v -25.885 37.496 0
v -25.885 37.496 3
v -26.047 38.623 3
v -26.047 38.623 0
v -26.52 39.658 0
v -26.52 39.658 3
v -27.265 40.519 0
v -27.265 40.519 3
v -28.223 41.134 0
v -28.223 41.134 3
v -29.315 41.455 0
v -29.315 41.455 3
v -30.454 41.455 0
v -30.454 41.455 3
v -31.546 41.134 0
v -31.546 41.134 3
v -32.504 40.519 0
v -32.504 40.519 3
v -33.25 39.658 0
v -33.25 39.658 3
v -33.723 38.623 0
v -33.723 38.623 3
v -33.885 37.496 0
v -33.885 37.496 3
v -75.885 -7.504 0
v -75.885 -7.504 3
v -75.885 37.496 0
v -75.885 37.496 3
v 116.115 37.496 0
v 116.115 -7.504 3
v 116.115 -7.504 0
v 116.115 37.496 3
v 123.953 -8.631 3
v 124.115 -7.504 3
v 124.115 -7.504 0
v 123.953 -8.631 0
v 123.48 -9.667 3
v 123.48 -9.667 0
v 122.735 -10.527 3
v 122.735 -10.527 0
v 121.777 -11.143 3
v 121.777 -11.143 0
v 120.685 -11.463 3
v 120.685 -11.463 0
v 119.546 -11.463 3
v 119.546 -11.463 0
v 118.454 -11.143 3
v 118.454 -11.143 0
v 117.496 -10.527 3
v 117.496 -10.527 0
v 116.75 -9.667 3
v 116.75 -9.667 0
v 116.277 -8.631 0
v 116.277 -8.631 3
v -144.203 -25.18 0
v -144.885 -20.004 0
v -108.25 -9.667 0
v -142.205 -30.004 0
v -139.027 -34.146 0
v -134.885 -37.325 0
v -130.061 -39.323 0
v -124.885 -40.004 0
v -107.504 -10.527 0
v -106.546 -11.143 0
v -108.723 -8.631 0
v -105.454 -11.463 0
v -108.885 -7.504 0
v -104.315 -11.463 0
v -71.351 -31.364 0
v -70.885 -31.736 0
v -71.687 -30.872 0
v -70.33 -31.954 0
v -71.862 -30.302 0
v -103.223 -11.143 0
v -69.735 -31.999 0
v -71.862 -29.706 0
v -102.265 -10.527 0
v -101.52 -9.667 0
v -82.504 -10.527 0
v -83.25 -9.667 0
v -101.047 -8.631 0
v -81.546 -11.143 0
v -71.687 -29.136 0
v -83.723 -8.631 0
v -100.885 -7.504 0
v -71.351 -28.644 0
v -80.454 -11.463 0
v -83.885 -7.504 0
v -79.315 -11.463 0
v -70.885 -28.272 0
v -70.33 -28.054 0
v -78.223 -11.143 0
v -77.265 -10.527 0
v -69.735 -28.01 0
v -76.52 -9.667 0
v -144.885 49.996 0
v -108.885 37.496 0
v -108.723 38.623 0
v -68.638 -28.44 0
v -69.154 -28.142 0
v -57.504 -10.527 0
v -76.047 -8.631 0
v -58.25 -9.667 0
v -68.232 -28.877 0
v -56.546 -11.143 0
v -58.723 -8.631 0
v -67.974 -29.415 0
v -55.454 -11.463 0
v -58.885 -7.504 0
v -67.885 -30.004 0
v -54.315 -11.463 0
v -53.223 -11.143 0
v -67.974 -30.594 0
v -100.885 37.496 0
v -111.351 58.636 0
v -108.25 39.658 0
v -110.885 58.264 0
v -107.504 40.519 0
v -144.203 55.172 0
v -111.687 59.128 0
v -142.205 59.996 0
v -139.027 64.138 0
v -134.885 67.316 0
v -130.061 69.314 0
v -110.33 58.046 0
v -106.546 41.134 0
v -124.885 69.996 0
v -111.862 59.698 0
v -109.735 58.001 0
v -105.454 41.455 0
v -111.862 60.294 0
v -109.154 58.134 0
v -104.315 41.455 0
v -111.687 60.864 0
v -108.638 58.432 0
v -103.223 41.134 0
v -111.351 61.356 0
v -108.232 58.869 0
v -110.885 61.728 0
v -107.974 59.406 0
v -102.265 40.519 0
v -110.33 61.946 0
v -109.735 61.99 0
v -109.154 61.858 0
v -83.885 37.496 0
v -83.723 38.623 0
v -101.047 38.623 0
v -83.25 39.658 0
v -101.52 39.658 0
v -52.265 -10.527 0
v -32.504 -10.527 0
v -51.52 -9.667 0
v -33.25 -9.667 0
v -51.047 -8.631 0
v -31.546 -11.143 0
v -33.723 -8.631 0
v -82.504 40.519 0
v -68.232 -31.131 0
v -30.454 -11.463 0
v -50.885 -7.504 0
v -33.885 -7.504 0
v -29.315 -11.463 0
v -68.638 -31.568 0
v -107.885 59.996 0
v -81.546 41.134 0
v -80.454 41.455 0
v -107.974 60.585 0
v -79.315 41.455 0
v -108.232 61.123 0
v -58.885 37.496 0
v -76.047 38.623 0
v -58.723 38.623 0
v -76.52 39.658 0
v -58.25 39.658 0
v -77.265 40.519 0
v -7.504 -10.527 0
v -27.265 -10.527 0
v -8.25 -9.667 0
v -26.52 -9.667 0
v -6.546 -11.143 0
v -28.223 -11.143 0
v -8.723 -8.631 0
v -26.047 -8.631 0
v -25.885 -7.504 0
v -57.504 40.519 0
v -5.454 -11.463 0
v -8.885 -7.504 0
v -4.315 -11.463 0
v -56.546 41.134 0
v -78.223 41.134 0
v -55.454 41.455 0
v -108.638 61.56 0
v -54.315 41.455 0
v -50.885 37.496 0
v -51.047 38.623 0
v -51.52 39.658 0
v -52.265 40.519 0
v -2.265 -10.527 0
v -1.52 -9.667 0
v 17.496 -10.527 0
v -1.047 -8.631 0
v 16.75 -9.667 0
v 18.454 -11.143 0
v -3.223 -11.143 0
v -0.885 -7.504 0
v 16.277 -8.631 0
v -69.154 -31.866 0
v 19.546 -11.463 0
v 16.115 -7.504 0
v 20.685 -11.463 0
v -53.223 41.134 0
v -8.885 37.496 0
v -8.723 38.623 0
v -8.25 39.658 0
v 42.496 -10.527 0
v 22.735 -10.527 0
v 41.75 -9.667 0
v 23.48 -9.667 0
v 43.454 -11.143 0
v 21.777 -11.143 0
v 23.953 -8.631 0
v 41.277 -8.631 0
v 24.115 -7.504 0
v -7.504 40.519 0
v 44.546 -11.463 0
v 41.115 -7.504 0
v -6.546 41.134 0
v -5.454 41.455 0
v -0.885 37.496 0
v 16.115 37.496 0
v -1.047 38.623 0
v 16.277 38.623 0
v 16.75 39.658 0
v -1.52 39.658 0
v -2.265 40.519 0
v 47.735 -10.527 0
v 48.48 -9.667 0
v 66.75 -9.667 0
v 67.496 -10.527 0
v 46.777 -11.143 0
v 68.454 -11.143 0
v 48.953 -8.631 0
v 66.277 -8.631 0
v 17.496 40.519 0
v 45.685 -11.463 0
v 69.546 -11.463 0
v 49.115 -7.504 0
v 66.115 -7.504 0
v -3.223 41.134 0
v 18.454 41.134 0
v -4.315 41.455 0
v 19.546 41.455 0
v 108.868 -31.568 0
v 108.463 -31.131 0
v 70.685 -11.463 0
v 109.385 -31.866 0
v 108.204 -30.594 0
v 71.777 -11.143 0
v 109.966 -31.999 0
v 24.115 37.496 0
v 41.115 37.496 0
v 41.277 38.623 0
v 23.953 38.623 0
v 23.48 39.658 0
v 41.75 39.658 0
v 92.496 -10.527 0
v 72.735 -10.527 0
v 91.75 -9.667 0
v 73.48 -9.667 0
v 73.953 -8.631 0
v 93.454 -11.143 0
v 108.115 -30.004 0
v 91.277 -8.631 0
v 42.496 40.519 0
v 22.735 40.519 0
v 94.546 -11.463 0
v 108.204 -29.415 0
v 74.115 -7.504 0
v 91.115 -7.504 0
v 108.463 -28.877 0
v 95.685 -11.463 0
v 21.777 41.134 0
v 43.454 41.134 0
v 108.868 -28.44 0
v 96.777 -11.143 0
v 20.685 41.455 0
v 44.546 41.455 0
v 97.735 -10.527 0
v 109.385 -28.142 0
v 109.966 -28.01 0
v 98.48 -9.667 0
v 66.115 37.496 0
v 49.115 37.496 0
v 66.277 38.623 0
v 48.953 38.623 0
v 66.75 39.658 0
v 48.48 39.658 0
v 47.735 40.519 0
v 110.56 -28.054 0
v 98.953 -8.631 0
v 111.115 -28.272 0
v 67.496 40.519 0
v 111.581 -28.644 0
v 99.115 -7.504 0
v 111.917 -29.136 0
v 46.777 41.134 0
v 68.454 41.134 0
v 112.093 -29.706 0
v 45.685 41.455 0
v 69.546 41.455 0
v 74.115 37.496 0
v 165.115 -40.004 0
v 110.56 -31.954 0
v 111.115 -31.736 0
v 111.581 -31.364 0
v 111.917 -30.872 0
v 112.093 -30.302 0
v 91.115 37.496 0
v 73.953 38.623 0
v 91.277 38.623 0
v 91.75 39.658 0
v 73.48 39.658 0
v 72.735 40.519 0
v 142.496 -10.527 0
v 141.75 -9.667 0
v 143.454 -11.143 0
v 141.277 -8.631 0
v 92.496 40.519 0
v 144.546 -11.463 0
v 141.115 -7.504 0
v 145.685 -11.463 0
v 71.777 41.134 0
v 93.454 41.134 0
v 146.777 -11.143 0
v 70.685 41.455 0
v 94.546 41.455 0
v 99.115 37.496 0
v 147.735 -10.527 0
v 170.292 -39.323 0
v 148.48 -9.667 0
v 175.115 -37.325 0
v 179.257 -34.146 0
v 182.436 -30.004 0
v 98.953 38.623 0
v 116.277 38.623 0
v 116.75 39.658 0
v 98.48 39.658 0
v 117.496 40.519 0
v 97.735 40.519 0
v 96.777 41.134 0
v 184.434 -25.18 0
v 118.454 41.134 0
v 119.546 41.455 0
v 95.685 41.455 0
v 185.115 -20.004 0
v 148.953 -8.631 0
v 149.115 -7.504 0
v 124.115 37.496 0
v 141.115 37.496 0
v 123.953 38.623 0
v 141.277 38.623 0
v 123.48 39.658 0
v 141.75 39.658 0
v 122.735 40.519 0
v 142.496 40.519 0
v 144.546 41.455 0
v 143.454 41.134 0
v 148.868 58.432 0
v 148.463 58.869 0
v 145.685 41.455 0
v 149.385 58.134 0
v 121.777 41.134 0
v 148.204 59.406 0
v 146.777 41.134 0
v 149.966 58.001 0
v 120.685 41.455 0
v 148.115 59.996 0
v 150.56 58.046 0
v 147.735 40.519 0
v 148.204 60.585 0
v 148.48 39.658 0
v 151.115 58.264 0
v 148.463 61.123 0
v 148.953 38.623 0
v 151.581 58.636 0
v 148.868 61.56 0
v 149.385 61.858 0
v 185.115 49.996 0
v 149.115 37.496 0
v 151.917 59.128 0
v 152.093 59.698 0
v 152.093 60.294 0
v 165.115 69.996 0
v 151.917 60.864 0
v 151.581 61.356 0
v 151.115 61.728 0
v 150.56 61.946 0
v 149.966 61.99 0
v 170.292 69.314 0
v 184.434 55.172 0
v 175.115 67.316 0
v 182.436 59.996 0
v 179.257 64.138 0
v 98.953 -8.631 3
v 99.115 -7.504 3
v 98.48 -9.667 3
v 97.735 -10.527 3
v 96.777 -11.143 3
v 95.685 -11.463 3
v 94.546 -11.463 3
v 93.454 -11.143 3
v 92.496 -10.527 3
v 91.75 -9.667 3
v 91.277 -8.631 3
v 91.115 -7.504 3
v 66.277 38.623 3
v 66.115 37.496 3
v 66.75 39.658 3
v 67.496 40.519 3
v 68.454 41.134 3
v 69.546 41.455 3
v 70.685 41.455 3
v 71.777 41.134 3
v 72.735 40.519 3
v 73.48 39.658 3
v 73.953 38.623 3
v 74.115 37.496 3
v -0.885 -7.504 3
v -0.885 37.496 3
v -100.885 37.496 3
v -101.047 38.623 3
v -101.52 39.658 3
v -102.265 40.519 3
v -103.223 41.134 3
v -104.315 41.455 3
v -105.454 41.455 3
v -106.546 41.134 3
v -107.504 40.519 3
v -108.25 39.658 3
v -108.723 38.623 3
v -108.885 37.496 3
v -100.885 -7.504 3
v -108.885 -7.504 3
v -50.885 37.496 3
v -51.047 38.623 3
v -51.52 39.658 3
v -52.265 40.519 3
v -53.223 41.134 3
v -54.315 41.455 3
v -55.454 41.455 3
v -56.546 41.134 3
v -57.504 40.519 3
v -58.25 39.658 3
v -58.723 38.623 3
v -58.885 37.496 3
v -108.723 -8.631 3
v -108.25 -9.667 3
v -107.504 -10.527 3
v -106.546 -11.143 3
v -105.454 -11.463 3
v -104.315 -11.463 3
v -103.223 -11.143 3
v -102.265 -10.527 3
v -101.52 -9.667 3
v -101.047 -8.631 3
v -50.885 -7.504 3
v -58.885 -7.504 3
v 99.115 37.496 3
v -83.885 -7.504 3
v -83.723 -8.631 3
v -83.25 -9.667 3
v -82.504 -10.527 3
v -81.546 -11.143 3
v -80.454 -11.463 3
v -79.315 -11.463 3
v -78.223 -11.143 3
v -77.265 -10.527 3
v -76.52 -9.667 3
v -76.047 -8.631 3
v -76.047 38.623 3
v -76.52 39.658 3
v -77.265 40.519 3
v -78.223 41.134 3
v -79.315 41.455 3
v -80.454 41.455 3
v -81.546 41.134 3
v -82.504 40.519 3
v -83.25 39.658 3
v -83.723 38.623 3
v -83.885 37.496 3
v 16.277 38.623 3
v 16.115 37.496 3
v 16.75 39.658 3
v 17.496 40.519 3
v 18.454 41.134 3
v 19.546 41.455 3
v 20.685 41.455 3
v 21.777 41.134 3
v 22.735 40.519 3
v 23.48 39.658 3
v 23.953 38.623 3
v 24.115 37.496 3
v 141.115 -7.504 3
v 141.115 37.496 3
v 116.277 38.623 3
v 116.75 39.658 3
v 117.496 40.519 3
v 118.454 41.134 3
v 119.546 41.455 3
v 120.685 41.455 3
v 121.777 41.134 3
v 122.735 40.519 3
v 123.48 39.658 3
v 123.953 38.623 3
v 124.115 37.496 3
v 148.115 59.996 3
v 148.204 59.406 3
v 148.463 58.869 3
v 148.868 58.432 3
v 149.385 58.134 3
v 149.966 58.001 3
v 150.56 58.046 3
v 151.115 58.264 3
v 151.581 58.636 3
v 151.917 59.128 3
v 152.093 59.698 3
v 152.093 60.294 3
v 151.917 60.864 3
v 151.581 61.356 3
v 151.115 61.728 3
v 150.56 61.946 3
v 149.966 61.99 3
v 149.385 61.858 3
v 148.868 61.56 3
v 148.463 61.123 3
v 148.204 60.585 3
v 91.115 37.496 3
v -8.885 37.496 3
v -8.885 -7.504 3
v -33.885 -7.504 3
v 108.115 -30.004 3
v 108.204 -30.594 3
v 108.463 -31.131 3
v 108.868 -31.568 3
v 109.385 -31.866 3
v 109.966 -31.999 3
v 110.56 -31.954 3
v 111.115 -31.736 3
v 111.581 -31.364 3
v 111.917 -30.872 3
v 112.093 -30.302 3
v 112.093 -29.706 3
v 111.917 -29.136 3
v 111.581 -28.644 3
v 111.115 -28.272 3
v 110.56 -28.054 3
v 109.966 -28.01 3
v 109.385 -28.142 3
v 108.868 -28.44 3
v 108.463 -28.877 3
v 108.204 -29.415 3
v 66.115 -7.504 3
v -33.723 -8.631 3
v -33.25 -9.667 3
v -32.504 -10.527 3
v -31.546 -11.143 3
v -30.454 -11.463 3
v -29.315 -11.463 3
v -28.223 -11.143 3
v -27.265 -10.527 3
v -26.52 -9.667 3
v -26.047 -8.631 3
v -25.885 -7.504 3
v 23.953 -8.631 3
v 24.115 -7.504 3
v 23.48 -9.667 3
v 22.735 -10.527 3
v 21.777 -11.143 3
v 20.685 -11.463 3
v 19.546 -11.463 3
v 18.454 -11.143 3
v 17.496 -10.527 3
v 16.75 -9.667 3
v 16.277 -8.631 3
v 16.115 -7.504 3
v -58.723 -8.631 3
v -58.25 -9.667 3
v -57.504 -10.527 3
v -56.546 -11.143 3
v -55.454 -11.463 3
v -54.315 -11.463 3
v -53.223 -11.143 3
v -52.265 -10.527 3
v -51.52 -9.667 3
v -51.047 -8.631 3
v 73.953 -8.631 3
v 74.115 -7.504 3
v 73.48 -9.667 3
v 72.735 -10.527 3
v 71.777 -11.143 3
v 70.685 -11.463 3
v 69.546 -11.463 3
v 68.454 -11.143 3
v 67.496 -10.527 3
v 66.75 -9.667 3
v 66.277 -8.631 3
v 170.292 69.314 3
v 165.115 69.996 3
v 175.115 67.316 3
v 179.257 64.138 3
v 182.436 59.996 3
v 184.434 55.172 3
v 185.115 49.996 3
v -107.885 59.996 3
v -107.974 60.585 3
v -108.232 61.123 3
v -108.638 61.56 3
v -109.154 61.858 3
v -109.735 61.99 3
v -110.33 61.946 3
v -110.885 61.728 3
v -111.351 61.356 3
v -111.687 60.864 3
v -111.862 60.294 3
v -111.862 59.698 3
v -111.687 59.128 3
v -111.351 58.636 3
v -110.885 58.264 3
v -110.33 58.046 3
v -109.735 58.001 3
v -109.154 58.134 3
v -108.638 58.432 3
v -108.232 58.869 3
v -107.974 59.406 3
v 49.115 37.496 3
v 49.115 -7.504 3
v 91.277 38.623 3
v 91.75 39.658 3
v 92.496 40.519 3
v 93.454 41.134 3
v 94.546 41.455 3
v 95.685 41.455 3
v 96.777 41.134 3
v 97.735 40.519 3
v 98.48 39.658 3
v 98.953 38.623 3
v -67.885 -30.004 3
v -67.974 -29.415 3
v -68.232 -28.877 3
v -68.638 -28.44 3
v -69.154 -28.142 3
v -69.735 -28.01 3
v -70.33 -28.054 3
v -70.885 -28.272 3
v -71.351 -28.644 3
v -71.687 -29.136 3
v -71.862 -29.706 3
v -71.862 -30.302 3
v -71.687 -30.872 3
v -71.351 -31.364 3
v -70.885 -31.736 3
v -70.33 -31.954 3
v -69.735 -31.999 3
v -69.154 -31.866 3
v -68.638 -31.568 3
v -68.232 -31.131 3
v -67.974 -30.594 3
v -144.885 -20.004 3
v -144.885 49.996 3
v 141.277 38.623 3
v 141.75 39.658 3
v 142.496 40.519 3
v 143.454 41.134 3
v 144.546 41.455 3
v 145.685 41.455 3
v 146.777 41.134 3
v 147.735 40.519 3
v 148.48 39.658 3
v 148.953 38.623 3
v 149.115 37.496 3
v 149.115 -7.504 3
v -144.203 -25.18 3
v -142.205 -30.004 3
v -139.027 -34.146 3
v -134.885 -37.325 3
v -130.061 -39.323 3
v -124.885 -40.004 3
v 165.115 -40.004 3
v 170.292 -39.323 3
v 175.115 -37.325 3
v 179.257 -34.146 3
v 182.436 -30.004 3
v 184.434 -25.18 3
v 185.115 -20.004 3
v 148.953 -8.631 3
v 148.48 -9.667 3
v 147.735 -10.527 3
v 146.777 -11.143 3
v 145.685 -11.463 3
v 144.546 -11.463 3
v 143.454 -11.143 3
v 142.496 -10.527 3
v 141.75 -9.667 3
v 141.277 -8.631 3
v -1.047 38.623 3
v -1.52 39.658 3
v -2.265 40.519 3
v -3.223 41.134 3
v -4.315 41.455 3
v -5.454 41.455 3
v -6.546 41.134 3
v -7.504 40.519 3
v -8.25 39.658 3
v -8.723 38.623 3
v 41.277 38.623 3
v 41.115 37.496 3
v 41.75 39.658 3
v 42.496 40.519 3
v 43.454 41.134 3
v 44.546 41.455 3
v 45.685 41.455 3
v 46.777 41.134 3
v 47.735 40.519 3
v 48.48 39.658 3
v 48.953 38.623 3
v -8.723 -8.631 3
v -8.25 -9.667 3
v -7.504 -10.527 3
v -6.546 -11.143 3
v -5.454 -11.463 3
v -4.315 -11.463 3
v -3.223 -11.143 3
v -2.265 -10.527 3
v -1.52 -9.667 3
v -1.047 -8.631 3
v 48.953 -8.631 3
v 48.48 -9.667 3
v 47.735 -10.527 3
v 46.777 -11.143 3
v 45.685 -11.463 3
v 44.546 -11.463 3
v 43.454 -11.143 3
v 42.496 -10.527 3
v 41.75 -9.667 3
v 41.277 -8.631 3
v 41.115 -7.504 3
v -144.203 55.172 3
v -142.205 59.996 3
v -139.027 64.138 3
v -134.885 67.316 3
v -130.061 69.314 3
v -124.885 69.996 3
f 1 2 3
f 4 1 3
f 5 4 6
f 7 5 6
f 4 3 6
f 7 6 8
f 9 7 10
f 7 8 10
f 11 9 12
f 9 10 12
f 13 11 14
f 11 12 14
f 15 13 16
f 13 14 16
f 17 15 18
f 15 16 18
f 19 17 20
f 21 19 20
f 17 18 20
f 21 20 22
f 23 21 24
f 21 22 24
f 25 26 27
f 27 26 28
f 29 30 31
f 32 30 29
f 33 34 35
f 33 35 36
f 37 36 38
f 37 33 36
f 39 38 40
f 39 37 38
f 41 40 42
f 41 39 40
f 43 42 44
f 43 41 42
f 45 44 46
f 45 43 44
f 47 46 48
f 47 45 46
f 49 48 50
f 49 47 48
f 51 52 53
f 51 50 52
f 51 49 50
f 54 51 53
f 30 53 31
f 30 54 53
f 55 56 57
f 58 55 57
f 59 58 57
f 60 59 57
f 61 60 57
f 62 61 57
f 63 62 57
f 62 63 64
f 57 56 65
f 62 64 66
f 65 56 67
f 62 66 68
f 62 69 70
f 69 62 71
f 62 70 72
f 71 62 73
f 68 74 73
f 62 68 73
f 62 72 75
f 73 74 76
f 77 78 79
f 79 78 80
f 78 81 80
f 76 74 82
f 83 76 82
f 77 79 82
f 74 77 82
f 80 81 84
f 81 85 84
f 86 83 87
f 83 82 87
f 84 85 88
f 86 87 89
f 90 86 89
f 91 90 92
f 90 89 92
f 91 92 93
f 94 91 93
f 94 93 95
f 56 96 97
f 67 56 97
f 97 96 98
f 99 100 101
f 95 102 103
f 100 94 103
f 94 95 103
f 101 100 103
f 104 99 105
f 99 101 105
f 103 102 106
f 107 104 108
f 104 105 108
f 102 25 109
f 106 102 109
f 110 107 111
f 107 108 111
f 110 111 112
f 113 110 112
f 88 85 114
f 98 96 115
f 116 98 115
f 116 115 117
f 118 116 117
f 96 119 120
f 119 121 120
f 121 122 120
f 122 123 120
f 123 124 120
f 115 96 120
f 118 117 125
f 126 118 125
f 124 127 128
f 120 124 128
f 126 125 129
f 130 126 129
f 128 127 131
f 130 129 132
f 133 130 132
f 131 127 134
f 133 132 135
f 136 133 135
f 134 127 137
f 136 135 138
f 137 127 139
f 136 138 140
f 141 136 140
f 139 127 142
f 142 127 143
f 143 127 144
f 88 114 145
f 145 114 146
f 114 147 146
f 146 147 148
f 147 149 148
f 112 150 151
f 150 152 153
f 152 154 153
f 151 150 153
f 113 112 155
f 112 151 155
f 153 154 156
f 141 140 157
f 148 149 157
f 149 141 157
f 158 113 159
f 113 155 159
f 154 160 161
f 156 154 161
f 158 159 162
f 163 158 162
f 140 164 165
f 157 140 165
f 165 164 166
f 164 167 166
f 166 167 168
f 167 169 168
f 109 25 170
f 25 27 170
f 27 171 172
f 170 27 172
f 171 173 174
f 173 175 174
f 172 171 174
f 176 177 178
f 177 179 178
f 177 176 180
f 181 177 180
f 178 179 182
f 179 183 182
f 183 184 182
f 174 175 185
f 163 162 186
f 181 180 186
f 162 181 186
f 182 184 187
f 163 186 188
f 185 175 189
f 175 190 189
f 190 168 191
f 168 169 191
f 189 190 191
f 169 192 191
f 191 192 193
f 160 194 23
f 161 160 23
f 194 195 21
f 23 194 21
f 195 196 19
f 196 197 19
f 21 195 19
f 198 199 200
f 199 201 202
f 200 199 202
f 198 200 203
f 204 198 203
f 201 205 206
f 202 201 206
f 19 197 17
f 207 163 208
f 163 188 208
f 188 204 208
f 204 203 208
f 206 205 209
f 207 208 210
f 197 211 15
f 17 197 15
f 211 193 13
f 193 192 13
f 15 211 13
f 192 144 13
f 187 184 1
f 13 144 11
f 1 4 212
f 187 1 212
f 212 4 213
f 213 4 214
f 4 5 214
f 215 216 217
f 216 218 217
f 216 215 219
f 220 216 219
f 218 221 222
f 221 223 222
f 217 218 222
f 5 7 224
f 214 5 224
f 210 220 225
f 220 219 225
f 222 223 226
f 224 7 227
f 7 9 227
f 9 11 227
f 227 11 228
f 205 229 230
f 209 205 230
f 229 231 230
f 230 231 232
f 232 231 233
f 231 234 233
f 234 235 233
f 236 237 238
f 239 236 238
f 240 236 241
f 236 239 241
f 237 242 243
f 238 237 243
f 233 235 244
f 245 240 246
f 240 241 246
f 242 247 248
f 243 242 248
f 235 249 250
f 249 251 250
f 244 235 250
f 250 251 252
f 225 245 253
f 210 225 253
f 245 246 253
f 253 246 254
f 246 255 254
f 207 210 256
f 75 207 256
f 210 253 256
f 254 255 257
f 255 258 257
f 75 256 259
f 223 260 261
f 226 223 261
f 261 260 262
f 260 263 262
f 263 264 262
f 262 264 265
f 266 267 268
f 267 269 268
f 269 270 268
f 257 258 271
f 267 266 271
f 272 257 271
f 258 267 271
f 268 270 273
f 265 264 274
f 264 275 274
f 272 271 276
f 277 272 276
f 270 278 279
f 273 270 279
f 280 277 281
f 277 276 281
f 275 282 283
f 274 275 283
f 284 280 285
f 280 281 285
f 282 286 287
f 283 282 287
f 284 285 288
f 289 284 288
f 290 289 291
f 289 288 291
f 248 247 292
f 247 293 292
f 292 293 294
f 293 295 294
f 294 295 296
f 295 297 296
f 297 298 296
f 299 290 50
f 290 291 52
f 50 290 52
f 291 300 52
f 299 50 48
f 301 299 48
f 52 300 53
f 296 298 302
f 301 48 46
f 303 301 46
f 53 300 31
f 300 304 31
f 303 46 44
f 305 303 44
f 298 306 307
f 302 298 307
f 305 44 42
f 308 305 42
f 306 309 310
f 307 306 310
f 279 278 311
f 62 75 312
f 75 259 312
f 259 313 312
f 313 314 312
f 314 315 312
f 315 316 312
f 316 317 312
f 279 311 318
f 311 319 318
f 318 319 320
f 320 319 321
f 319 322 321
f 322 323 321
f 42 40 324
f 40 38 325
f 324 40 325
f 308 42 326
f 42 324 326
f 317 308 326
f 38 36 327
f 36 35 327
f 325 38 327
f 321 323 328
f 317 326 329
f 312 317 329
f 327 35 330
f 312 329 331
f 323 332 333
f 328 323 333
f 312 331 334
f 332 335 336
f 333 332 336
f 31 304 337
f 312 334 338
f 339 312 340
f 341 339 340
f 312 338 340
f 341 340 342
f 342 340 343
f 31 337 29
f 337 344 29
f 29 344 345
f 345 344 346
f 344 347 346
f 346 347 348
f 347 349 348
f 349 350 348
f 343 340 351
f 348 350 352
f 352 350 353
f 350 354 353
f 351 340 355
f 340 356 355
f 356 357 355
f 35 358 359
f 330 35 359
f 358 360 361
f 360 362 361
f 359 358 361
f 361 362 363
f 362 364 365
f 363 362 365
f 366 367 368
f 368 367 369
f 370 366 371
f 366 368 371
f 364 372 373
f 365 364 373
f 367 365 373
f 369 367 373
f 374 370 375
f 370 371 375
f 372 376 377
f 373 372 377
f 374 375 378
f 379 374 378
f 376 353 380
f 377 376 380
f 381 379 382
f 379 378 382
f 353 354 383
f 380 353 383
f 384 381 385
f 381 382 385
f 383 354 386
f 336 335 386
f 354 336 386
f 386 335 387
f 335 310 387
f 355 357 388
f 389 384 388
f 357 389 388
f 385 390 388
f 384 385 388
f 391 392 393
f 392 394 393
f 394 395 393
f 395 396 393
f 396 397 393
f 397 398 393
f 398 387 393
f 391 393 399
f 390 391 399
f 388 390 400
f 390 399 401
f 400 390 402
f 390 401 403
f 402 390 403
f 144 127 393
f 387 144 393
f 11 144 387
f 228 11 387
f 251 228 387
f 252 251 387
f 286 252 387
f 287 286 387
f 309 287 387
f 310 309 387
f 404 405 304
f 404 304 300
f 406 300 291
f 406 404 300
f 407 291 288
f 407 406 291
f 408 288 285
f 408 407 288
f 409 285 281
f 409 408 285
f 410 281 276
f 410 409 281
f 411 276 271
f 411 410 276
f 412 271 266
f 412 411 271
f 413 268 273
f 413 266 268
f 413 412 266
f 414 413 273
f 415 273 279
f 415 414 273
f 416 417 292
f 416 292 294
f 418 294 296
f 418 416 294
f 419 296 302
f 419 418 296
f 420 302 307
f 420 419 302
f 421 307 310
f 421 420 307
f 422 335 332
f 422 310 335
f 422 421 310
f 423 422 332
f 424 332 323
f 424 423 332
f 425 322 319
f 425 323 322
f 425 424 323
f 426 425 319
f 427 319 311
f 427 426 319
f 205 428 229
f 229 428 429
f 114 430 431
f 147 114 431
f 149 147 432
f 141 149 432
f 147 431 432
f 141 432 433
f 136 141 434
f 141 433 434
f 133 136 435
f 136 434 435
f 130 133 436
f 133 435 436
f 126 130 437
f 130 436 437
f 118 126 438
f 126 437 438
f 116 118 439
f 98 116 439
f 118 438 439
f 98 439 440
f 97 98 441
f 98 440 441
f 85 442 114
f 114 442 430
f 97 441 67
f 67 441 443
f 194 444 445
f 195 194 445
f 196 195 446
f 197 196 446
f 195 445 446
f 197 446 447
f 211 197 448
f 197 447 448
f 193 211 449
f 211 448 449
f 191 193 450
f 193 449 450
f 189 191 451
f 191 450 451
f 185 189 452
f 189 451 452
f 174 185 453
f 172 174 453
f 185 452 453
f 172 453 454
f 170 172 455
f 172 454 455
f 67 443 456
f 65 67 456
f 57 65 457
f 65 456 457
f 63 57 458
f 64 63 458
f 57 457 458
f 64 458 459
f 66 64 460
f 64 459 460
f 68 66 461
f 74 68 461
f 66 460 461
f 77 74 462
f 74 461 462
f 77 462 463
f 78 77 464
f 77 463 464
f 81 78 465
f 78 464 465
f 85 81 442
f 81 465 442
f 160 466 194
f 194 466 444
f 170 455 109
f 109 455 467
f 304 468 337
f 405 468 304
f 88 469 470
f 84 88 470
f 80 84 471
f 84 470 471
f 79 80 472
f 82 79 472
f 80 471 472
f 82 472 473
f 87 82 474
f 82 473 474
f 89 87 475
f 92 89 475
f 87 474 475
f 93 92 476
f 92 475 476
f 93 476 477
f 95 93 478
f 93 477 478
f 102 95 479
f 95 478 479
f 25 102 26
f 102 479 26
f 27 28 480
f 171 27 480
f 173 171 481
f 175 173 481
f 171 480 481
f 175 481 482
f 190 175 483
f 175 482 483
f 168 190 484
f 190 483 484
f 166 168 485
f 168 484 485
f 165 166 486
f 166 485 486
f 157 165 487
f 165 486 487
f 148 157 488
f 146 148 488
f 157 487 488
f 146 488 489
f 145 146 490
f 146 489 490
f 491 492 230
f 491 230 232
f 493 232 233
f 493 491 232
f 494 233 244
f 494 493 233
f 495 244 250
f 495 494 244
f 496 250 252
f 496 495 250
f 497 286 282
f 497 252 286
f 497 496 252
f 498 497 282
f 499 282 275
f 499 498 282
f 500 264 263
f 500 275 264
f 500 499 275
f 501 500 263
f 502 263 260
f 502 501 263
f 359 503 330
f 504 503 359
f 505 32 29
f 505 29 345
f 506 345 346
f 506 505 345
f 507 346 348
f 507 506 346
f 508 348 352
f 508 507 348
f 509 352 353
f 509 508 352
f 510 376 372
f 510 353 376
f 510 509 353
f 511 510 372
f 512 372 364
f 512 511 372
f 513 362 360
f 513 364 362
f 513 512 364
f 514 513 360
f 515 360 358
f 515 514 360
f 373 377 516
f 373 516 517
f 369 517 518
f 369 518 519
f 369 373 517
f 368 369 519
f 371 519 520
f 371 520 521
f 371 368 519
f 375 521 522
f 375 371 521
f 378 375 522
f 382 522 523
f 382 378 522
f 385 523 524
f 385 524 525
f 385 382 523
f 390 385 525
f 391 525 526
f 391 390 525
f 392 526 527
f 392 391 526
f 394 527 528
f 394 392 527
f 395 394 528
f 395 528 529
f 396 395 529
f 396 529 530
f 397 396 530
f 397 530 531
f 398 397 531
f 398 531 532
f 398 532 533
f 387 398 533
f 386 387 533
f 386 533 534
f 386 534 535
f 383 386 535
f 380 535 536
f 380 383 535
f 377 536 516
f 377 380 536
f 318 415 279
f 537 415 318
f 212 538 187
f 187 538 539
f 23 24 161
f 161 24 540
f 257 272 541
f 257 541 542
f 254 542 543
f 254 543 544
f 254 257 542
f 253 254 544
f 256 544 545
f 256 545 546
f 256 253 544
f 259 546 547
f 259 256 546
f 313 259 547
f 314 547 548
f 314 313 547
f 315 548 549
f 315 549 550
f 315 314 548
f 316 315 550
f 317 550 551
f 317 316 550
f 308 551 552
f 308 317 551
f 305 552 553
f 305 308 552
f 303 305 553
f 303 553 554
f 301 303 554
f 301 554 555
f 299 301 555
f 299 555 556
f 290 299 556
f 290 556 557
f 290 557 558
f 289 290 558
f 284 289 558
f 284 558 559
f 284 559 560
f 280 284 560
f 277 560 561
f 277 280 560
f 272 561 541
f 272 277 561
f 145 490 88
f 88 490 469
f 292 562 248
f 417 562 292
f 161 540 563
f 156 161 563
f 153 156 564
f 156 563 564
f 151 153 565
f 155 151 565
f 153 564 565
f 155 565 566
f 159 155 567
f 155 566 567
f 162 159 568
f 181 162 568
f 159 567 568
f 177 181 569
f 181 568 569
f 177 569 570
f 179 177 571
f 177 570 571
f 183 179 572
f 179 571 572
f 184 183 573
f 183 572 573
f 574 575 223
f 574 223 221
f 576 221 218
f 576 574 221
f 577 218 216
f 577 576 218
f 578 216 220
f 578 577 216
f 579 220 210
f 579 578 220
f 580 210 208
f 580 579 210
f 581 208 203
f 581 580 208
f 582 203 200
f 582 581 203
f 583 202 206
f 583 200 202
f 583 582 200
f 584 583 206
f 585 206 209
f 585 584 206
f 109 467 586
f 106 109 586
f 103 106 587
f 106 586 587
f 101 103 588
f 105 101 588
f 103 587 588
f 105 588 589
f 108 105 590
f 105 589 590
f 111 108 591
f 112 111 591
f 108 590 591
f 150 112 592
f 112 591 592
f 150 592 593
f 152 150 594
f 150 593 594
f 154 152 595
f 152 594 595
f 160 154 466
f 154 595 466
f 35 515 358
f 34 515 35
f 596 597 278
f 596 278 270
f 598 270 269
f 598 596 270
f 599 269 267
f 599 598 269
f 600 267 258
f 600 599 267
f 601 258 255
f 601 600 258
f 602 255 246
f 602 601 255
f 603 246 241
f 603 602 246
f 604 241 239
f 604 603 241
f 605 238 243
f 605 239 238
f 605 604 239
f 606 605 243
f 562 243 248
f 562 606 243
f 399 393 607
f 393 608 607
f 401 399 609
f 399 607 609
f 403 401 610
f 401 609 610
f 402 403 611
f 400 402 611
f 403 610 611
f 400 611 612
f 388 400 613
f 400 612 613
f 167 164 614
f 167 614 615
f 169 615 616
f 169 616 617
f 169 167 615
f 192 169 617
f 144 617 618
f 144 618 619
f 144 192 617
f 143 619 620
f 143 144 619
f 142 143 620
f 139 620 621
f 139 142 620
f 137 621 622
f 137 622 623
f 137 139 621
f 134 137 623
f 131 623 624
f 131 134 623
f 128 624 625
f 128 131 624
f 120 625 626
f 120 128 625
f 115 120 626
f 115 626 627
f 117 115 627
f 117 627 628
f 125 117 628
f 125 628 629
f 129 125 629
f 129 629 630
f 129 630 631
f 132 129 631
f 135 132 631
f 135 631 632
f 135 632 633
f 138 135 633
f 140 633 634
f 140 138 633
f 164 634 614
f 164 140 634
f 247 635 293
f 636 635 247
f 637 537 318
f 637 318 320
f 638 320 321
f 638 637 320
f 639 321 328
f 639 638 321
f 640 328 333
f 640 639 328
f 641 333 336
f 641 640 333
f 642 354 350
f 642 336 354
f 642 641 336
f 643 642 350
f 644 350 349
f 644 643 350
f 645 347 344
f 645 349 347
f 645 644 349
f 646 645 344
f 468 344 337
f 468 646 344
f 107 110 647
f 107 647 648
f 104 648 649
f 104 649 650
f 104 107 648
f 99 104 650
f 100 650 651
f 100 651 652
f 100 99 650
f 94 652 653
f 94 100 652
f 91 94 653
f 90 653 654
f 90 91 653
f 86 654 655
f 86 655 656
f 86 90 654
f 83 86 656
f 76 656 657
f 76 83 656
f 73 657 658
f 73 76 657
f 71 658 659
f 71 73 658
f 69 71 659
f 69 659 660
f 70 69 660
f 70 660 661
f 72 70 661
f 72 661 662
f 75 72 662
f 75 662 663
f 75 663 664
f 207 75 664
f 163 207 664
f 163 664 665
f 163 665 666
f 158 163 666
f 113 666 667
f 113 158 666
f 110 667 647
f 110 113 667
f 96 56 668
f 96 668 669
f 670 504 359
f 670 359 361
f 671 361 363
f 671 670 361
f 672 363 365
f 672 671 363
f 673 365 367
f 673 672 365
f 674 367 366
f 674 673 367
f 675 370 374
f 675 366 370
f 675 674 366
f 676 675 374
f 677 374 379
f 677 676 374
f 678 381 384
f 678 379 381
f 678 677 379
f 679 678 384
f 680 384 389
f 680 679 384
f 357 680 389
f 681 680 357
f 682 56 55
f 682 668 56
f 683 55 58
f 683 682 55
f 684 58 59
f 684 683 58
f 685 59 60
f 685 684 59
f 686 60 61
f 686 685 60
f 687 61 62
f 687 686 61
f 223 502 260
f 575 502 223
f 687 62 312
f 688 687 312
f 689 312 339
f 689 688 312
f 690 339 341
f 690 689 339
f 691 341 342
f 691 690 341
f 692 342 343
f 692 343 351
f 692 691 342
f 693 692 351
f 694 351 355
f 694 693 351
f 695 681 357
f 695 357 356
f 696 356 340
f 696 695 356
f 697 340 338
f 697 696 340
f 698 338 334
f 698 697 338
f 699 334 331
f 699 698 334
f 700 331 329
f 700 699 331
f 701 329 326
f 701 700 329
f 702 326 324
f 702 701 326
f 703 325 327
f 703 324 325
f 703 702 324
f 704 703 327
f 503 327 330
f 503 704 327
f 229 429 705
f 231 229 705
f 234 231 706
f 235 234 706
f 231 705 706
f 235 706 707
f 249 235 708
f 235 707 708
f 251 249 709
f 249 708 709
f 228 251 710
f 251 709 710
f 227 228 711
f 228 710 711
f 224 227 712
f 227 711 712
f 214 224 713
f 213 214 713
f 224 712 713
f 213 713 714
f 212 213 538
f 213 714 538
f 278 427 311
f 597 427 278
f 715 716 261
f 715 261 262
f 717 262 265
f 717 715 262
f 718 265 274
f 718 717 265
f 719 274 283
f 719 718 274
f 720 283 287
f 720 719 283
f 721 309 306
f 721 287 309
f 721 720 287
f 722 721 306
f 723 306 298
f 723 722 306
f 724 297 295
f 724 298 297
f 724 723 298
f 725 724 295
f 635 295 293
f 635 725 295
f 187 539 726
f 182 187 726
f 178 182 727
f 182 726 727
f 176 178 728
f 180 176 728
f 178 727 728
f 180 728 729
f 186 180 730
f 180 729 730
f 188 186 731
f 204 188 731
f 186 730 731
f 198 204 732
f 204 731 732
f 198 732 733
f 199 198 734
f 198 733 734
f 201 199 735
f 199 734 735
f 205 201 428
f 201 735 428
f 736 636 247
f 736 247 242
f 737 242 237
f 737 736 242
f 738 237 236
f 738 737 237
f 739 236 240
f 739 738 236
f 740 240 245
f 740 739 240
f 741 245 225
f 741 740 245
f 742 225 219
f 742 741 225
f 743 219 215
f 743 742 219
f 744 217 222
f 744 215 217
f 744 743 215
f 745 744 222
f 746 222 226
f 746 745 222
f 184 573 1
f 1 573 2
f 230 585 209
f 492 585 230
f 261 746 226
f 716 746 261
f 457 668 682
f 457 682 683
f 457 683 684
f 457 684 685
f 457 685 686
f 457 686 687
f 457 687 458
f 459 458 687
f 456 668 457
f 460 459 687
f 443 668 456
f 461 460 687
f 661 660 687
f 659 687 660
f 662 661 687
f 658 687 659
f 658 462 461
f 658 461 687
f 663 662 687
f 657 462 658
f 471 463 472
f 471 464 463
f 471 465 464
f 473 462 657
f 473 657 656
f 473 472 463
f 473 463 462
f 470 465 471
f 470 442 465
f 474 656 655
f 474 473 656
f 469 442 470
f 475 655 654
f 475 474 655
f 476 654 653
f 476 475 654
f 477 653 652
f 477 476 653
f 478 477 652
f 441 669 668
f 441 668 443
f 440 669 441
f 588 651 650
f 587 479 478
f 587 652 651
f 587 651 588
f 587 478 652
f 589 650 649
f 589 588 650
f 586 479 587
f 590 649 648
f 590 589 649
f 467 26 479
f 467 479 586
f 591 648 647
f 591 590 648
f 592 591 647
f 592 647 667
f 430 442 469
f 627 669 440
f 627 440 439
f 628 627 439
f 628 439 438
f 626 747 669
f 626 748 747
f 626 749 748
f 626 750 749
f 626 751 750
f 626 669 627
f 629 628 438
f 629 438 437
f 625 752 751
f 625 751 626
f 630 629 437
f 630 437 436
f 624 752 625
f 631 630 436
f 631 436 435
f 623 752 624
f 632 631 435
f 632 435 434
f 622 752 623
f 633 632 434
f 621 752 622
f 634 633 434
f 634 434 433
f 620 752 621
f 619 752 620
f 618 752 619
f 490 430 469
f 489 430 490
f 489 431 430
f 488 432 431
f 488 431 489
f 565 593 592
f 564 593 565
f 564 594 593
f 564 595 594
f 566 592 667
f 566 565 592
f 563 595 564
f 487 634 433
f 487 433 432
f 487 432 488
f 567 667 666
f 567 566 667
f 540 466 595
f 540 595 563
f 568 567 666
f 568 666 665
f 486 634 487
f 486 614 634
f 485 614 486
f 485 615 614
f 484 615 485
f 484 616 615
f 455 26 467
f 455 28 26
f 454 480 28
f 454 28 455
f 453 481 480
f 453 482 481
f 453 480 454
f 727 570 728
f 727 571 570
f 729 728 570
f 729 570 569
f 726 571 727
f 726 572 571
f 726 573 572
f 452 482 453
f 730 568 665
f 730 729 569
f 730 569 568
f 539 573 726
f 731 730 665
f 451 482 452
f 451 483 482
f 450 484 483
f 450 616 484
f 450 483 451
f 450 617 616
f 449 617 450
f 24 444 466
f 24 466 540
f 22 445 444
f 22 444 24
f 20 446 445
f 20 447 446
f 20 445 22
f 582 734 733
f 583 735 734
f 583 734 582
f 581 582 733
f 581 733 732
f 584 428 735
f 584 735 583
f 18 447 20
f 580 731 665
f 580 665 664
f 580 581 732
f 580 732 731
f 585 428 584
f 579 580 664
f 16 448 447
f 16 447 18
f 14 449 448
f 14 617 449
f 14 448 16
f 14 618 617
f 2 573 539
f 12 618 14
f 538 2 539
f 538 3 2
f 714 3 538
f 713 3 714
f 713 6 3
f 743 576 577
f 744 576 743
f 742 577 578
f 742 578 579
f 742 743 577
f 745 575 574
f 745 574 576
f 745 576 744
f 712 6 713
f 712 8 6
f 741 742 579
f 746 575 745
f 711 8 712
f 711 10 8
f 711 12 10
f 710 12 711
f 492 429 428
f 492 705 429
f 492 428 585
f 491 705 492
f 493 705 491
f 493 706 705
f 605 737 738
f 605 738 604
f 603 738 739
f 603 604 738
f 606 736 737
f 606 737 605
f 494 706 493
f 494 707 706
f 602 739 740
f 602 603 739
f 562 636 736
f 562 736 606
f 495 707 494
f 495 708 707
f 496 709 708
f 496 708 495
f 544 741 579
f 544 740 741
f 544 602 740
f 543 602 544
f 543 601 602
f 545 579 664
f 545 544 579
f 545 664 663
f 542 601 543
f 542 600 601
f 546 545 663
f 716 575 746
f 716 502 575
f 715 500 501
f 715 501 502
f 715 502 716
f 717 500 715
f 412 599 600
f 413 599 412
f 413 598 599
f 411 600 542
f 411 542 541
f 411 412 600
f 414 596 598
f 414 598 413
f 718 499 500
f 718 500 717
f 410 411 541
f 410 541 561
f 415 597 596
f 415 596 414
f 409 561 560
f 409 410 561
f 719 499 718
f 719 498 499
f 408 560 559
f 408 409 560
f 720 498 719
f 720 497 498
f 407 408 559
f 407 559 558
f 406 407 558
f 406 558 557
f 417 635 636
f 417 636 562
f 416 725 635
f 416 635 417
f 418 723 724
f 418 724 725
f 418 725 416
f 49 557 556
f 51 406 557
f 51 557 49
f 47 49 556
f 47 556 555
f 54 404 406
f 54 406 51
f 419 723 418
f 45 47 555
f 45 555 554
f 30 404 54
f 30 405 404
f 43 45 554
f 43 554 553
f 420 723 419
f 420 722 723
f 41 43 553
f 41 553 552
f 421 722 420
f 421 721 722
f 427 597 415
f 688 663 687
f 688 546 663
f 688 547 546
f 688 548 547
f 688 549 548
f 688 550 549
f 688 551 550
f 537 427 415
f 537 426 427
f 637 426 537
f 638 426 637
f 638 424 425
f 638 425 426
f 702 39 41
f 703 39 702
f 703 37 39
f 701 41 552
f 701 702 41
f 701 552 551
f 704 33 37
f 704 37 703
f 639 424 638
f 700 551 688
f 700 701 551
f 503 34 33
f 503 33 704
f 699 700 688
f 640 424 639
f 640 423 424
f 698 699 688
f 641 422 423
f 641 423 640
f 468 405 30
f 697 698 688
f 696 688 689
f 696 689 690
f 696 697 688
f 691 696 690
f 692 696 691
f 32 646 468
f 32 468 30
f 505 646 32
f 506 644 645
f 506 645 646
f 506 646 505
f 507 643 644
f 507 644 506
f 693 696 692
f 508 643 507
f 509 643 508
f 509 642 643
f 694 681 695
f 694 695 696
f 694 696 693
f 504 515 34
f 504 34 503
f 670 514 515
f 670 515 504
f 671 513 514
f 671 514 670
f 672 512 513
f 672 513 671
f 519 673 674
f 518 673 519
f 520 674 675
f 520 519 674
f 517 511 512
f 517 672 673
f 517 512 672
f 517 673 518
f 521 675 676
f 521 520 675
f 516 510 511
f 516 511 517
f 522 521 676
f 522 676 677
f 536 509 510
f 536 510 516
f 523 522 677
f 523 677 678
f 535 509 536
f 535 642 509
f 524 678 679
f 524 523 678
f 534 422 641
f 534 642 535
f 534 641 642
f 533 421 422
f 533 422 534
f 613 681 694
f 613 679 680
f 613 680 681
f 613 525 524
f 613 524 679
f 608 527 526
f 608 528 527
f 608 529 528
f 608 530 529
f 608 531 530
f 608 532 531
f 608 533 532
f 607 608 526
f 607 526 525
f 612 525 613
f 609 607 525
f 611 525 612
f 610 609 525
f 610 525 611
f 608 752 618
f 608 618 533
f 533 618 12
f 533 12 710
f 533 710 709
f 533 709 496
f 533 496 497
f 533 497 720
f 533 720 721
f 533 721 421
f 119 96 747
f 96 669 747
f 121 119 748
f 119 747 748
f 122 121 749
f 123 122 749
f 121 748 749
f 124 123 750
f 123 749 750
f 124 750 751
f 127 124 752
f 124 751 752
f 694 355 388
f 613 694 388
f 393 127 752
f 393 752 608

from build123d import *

# Parameters (mm, degrees)
SKETCH_2_W          = 330
SKETCH_2_H          = 110
SKETCH_2_R          = 2
EXTRUDE_1_DEPTH     = 3
CUT_EXTRUDE_1_DEPTH = 198.929546993
FILLET_1_R          = 20


with BuildPart() as part:
    # 草图2 → 凸台-拉伸1 (new body)
    with BuildSketch(Plane.XY):
        with Locations((20.115321252, 14.995881384)):
            Rectangle(SKETCH_2_W, SKETCH_2_H)
        with Locations((-109.884678748, 59.995881384)):
            Circle(SKETCH_2_R, mode=Mode.SUBTRACT)
        with Locations(Location((150.115321252, 59.995881384, 0), (0, 0, 180))):
            Circle(SKETCH_2_R, mode=Mode.SUBTRACT)
        with Locations((-69.884678748, -30.004118616)):
            Circle(SKETCH_2_R, mode=Mode.SUBTRACT)
        with Locations(Location((110.115321252, -30.004118616, 0), (0, 0, 180))):
            Circle(SKETCH_2_R, mode=Mode.SUBTRACT)
    extrude(amount=EXTRUDE_1_DEPTH)

    # 草图3 → 切除-拉伸1 (cut, through all)
    with BuildSketch(Plane.XY.offset(3)):
        with BuildLine():
            Line((16.115321252, -7.504118616), (16.115321252, 37.495881384))
            ThreePointArc((16.115321252, 37.495881384), (20.115321252, 41.495881384), (24.115321252, 37.495881384))
            Line((24.115321252, 37.495881384), (24.115321252, -7.504118616))
            ThreePointArc((24.115321252, -7.504118616), (20.115321252, -11.504118616), (16.115321252, -7.504118616))
        make_face()
        with BuildLine():
            Line((41.115321252, -7.504118616), (41.115321252, 37.495881384))
            ThreePointArc((41.115321252, 37.495881384), (45.115321252, 41.495881384), (49.115321252, 37.495881384))
            Line((49.115321252, 37.495881384), (49.115321252, -7.504118616))
            ThreePointArc((49.115321252, -7.504118616), (45.115321252, -11.504118616), (41.115321252, -7.504118616))
        make_face()
        with BuildLine():
            Line((66.115321252, -7.504118616), (66.115321252, 37.495881384))
            ThreePointArc((66.115321252, 37.495881384), (70.115321252, 41.495881384), (74.115321252, 37.495881384))
            Line((74.115321252, 37.495881384), (74.115321252, -7.504118616))
            ThreePointArc((74.115321252, -7.504118616), (70.115321252, -11.504118616), (66.115321252, -7.504118616))
        make_face()
        with BuildLine():
            Line((91.115321252, -7.504118616), (91.115321252, 37.495881384))
            ThreePointArc((91.115321252, 37.495881384), (95.115321252, 41.495881384), (99.115321252, 37.495881384))
            Line((99.115321252, 37.495881384), (99.115321252, -7.504118616))
            ThreePointArc((99.115321252, -7.504118616), (95.115321252, -11.504118616), (91.115321252, -7.504118616))
        make_face()
        with BuildLine():
            Line((116.115321252, -7.504118616), (116.115321252, 37.495881384))
            ThreePointArc((116.115321252, 37.495881384), (120.115321252, 41.495881384), (124.115321252, 37.495881384))
            Line((124.115321252, 37.495881384), (124.115321252, -7.504118616))
            ThreePointArc((124.115321252, -7.504118616), (120.115321252, -11.504118616), (116.115321252, -7.504118616))
        make_face()
        with BuildLine():
            Line((141.115321252, -7.504118616), (141.115321252, 37.495881384))
            ThreePointArc((141.115321252, 37.495881384), (145.115321252, 41.495881384), (149.115321252, 37.495881384))
            Line((149.115321252, 37.495881384), (149.115321252, -7.504118616))
            ThreePointArc((149.115321252, -7.504118616), (145.115321252, -11.504118616), (141.115321252, -7.504118616))
        make_face()
        with BuildLine():
            Line((-0.884678748, -7.504118616), (-0.884678748, 37.495881384))
            ThreePointArc((-0.884678748, 37.495881384), (-4.884678748, 41.495881384), (-8.884678748, 37.495881384))
            Line((-8.884678748, 37.495881384), (-8.884678748, -7.504118616))
            ThreePointArc((-8.884678748, -7.504118616), (-4.884678748, -11.504118616), (-0.884678748, -7.504118616))
        make_face()
        with BuildLine():
            Line((-25.884678748, -7.504118616), (-25.884678748, 37.495881384))
            ThreePointArc((-25.884678748, 37.495881384), (-29.884678748, 41.495881384), (-33.884678748, 37.495881384))
            Line((-33.884678748, 37.495881384), (-33.884678748, -7.504118616))
            ThreePointArc((-33.884678748, -7.504118616), (-29.884678748, -11.504118616), (-25.884678748, -7.504118616))
        make_face()
        with BuildLine():
            Line((-50.884678748, -7.504118616), (-50.884678748, 37.495881384))
            ThreePointArc((-50.884678748, 37.495881384), (-54.884678748, 41.495881384), (-58.884678748, 37.495881384))
            Line((-58.884678748, 37.495881384), (-58.884678748, -7.504118616))
            ThreePointArc((-58.884678748, -7.504118616), (-54.884678748, -11.504118616), (-50.884678748, -7.504118616))
        make_face()
        with BuildLine():
            Line((-75.884678748, -7.504118616), (-75.884678748, 37.495881384))
            ThreePointArc((-75.884678748, 37.495881384), (-79.884678748, 41.495881384), (-83.884678748, 37.495881384))
            Line((-83.884678748, 37.495881384), (-83.884678748, -7.504118616))
            ThreePointArc((-83.884678748, -7.504118616), (-79.884678748, -11.504118616), (-75.884678748, -7.504118616))
        make_face()
        with BuildLine():
            Line((-100.884678748, -7.504118616), (-100.884678748, 37.495881384))
            ThreePointArc((-100.884678748, 37.495881384), (-104.884678748, 41.495881384), (-108.884678748, 37.495881384))
            Line((-108.884678748, 37.495881384), (-108.884678748, -7.504118616))
            ThreePointArc((-108.884678748, -7.504118616), (-104.884678748, -11.504118616), (-100.884678748, -7.504118616))
        make_face()
    extrude(amount=-CUT_EXTRUDE_1_DEPTH, mode=Mode.SUBTRACT)

    # 圆角1
    fillet_1_edges = [part.edges().sort_by_distance(p)[0] for p in [
        (-144.884678748, 69.995881384, 1.5),
        (185.115321252, 69.995881384, 1.5),
        (185.115321252, -40.004118616, 1.5),
        (-144.884678748, -40.004118616, 1.5),
    ]]
    fillet(fillet_1_edges, radius=FILLET_1_R)


solid = part.part
